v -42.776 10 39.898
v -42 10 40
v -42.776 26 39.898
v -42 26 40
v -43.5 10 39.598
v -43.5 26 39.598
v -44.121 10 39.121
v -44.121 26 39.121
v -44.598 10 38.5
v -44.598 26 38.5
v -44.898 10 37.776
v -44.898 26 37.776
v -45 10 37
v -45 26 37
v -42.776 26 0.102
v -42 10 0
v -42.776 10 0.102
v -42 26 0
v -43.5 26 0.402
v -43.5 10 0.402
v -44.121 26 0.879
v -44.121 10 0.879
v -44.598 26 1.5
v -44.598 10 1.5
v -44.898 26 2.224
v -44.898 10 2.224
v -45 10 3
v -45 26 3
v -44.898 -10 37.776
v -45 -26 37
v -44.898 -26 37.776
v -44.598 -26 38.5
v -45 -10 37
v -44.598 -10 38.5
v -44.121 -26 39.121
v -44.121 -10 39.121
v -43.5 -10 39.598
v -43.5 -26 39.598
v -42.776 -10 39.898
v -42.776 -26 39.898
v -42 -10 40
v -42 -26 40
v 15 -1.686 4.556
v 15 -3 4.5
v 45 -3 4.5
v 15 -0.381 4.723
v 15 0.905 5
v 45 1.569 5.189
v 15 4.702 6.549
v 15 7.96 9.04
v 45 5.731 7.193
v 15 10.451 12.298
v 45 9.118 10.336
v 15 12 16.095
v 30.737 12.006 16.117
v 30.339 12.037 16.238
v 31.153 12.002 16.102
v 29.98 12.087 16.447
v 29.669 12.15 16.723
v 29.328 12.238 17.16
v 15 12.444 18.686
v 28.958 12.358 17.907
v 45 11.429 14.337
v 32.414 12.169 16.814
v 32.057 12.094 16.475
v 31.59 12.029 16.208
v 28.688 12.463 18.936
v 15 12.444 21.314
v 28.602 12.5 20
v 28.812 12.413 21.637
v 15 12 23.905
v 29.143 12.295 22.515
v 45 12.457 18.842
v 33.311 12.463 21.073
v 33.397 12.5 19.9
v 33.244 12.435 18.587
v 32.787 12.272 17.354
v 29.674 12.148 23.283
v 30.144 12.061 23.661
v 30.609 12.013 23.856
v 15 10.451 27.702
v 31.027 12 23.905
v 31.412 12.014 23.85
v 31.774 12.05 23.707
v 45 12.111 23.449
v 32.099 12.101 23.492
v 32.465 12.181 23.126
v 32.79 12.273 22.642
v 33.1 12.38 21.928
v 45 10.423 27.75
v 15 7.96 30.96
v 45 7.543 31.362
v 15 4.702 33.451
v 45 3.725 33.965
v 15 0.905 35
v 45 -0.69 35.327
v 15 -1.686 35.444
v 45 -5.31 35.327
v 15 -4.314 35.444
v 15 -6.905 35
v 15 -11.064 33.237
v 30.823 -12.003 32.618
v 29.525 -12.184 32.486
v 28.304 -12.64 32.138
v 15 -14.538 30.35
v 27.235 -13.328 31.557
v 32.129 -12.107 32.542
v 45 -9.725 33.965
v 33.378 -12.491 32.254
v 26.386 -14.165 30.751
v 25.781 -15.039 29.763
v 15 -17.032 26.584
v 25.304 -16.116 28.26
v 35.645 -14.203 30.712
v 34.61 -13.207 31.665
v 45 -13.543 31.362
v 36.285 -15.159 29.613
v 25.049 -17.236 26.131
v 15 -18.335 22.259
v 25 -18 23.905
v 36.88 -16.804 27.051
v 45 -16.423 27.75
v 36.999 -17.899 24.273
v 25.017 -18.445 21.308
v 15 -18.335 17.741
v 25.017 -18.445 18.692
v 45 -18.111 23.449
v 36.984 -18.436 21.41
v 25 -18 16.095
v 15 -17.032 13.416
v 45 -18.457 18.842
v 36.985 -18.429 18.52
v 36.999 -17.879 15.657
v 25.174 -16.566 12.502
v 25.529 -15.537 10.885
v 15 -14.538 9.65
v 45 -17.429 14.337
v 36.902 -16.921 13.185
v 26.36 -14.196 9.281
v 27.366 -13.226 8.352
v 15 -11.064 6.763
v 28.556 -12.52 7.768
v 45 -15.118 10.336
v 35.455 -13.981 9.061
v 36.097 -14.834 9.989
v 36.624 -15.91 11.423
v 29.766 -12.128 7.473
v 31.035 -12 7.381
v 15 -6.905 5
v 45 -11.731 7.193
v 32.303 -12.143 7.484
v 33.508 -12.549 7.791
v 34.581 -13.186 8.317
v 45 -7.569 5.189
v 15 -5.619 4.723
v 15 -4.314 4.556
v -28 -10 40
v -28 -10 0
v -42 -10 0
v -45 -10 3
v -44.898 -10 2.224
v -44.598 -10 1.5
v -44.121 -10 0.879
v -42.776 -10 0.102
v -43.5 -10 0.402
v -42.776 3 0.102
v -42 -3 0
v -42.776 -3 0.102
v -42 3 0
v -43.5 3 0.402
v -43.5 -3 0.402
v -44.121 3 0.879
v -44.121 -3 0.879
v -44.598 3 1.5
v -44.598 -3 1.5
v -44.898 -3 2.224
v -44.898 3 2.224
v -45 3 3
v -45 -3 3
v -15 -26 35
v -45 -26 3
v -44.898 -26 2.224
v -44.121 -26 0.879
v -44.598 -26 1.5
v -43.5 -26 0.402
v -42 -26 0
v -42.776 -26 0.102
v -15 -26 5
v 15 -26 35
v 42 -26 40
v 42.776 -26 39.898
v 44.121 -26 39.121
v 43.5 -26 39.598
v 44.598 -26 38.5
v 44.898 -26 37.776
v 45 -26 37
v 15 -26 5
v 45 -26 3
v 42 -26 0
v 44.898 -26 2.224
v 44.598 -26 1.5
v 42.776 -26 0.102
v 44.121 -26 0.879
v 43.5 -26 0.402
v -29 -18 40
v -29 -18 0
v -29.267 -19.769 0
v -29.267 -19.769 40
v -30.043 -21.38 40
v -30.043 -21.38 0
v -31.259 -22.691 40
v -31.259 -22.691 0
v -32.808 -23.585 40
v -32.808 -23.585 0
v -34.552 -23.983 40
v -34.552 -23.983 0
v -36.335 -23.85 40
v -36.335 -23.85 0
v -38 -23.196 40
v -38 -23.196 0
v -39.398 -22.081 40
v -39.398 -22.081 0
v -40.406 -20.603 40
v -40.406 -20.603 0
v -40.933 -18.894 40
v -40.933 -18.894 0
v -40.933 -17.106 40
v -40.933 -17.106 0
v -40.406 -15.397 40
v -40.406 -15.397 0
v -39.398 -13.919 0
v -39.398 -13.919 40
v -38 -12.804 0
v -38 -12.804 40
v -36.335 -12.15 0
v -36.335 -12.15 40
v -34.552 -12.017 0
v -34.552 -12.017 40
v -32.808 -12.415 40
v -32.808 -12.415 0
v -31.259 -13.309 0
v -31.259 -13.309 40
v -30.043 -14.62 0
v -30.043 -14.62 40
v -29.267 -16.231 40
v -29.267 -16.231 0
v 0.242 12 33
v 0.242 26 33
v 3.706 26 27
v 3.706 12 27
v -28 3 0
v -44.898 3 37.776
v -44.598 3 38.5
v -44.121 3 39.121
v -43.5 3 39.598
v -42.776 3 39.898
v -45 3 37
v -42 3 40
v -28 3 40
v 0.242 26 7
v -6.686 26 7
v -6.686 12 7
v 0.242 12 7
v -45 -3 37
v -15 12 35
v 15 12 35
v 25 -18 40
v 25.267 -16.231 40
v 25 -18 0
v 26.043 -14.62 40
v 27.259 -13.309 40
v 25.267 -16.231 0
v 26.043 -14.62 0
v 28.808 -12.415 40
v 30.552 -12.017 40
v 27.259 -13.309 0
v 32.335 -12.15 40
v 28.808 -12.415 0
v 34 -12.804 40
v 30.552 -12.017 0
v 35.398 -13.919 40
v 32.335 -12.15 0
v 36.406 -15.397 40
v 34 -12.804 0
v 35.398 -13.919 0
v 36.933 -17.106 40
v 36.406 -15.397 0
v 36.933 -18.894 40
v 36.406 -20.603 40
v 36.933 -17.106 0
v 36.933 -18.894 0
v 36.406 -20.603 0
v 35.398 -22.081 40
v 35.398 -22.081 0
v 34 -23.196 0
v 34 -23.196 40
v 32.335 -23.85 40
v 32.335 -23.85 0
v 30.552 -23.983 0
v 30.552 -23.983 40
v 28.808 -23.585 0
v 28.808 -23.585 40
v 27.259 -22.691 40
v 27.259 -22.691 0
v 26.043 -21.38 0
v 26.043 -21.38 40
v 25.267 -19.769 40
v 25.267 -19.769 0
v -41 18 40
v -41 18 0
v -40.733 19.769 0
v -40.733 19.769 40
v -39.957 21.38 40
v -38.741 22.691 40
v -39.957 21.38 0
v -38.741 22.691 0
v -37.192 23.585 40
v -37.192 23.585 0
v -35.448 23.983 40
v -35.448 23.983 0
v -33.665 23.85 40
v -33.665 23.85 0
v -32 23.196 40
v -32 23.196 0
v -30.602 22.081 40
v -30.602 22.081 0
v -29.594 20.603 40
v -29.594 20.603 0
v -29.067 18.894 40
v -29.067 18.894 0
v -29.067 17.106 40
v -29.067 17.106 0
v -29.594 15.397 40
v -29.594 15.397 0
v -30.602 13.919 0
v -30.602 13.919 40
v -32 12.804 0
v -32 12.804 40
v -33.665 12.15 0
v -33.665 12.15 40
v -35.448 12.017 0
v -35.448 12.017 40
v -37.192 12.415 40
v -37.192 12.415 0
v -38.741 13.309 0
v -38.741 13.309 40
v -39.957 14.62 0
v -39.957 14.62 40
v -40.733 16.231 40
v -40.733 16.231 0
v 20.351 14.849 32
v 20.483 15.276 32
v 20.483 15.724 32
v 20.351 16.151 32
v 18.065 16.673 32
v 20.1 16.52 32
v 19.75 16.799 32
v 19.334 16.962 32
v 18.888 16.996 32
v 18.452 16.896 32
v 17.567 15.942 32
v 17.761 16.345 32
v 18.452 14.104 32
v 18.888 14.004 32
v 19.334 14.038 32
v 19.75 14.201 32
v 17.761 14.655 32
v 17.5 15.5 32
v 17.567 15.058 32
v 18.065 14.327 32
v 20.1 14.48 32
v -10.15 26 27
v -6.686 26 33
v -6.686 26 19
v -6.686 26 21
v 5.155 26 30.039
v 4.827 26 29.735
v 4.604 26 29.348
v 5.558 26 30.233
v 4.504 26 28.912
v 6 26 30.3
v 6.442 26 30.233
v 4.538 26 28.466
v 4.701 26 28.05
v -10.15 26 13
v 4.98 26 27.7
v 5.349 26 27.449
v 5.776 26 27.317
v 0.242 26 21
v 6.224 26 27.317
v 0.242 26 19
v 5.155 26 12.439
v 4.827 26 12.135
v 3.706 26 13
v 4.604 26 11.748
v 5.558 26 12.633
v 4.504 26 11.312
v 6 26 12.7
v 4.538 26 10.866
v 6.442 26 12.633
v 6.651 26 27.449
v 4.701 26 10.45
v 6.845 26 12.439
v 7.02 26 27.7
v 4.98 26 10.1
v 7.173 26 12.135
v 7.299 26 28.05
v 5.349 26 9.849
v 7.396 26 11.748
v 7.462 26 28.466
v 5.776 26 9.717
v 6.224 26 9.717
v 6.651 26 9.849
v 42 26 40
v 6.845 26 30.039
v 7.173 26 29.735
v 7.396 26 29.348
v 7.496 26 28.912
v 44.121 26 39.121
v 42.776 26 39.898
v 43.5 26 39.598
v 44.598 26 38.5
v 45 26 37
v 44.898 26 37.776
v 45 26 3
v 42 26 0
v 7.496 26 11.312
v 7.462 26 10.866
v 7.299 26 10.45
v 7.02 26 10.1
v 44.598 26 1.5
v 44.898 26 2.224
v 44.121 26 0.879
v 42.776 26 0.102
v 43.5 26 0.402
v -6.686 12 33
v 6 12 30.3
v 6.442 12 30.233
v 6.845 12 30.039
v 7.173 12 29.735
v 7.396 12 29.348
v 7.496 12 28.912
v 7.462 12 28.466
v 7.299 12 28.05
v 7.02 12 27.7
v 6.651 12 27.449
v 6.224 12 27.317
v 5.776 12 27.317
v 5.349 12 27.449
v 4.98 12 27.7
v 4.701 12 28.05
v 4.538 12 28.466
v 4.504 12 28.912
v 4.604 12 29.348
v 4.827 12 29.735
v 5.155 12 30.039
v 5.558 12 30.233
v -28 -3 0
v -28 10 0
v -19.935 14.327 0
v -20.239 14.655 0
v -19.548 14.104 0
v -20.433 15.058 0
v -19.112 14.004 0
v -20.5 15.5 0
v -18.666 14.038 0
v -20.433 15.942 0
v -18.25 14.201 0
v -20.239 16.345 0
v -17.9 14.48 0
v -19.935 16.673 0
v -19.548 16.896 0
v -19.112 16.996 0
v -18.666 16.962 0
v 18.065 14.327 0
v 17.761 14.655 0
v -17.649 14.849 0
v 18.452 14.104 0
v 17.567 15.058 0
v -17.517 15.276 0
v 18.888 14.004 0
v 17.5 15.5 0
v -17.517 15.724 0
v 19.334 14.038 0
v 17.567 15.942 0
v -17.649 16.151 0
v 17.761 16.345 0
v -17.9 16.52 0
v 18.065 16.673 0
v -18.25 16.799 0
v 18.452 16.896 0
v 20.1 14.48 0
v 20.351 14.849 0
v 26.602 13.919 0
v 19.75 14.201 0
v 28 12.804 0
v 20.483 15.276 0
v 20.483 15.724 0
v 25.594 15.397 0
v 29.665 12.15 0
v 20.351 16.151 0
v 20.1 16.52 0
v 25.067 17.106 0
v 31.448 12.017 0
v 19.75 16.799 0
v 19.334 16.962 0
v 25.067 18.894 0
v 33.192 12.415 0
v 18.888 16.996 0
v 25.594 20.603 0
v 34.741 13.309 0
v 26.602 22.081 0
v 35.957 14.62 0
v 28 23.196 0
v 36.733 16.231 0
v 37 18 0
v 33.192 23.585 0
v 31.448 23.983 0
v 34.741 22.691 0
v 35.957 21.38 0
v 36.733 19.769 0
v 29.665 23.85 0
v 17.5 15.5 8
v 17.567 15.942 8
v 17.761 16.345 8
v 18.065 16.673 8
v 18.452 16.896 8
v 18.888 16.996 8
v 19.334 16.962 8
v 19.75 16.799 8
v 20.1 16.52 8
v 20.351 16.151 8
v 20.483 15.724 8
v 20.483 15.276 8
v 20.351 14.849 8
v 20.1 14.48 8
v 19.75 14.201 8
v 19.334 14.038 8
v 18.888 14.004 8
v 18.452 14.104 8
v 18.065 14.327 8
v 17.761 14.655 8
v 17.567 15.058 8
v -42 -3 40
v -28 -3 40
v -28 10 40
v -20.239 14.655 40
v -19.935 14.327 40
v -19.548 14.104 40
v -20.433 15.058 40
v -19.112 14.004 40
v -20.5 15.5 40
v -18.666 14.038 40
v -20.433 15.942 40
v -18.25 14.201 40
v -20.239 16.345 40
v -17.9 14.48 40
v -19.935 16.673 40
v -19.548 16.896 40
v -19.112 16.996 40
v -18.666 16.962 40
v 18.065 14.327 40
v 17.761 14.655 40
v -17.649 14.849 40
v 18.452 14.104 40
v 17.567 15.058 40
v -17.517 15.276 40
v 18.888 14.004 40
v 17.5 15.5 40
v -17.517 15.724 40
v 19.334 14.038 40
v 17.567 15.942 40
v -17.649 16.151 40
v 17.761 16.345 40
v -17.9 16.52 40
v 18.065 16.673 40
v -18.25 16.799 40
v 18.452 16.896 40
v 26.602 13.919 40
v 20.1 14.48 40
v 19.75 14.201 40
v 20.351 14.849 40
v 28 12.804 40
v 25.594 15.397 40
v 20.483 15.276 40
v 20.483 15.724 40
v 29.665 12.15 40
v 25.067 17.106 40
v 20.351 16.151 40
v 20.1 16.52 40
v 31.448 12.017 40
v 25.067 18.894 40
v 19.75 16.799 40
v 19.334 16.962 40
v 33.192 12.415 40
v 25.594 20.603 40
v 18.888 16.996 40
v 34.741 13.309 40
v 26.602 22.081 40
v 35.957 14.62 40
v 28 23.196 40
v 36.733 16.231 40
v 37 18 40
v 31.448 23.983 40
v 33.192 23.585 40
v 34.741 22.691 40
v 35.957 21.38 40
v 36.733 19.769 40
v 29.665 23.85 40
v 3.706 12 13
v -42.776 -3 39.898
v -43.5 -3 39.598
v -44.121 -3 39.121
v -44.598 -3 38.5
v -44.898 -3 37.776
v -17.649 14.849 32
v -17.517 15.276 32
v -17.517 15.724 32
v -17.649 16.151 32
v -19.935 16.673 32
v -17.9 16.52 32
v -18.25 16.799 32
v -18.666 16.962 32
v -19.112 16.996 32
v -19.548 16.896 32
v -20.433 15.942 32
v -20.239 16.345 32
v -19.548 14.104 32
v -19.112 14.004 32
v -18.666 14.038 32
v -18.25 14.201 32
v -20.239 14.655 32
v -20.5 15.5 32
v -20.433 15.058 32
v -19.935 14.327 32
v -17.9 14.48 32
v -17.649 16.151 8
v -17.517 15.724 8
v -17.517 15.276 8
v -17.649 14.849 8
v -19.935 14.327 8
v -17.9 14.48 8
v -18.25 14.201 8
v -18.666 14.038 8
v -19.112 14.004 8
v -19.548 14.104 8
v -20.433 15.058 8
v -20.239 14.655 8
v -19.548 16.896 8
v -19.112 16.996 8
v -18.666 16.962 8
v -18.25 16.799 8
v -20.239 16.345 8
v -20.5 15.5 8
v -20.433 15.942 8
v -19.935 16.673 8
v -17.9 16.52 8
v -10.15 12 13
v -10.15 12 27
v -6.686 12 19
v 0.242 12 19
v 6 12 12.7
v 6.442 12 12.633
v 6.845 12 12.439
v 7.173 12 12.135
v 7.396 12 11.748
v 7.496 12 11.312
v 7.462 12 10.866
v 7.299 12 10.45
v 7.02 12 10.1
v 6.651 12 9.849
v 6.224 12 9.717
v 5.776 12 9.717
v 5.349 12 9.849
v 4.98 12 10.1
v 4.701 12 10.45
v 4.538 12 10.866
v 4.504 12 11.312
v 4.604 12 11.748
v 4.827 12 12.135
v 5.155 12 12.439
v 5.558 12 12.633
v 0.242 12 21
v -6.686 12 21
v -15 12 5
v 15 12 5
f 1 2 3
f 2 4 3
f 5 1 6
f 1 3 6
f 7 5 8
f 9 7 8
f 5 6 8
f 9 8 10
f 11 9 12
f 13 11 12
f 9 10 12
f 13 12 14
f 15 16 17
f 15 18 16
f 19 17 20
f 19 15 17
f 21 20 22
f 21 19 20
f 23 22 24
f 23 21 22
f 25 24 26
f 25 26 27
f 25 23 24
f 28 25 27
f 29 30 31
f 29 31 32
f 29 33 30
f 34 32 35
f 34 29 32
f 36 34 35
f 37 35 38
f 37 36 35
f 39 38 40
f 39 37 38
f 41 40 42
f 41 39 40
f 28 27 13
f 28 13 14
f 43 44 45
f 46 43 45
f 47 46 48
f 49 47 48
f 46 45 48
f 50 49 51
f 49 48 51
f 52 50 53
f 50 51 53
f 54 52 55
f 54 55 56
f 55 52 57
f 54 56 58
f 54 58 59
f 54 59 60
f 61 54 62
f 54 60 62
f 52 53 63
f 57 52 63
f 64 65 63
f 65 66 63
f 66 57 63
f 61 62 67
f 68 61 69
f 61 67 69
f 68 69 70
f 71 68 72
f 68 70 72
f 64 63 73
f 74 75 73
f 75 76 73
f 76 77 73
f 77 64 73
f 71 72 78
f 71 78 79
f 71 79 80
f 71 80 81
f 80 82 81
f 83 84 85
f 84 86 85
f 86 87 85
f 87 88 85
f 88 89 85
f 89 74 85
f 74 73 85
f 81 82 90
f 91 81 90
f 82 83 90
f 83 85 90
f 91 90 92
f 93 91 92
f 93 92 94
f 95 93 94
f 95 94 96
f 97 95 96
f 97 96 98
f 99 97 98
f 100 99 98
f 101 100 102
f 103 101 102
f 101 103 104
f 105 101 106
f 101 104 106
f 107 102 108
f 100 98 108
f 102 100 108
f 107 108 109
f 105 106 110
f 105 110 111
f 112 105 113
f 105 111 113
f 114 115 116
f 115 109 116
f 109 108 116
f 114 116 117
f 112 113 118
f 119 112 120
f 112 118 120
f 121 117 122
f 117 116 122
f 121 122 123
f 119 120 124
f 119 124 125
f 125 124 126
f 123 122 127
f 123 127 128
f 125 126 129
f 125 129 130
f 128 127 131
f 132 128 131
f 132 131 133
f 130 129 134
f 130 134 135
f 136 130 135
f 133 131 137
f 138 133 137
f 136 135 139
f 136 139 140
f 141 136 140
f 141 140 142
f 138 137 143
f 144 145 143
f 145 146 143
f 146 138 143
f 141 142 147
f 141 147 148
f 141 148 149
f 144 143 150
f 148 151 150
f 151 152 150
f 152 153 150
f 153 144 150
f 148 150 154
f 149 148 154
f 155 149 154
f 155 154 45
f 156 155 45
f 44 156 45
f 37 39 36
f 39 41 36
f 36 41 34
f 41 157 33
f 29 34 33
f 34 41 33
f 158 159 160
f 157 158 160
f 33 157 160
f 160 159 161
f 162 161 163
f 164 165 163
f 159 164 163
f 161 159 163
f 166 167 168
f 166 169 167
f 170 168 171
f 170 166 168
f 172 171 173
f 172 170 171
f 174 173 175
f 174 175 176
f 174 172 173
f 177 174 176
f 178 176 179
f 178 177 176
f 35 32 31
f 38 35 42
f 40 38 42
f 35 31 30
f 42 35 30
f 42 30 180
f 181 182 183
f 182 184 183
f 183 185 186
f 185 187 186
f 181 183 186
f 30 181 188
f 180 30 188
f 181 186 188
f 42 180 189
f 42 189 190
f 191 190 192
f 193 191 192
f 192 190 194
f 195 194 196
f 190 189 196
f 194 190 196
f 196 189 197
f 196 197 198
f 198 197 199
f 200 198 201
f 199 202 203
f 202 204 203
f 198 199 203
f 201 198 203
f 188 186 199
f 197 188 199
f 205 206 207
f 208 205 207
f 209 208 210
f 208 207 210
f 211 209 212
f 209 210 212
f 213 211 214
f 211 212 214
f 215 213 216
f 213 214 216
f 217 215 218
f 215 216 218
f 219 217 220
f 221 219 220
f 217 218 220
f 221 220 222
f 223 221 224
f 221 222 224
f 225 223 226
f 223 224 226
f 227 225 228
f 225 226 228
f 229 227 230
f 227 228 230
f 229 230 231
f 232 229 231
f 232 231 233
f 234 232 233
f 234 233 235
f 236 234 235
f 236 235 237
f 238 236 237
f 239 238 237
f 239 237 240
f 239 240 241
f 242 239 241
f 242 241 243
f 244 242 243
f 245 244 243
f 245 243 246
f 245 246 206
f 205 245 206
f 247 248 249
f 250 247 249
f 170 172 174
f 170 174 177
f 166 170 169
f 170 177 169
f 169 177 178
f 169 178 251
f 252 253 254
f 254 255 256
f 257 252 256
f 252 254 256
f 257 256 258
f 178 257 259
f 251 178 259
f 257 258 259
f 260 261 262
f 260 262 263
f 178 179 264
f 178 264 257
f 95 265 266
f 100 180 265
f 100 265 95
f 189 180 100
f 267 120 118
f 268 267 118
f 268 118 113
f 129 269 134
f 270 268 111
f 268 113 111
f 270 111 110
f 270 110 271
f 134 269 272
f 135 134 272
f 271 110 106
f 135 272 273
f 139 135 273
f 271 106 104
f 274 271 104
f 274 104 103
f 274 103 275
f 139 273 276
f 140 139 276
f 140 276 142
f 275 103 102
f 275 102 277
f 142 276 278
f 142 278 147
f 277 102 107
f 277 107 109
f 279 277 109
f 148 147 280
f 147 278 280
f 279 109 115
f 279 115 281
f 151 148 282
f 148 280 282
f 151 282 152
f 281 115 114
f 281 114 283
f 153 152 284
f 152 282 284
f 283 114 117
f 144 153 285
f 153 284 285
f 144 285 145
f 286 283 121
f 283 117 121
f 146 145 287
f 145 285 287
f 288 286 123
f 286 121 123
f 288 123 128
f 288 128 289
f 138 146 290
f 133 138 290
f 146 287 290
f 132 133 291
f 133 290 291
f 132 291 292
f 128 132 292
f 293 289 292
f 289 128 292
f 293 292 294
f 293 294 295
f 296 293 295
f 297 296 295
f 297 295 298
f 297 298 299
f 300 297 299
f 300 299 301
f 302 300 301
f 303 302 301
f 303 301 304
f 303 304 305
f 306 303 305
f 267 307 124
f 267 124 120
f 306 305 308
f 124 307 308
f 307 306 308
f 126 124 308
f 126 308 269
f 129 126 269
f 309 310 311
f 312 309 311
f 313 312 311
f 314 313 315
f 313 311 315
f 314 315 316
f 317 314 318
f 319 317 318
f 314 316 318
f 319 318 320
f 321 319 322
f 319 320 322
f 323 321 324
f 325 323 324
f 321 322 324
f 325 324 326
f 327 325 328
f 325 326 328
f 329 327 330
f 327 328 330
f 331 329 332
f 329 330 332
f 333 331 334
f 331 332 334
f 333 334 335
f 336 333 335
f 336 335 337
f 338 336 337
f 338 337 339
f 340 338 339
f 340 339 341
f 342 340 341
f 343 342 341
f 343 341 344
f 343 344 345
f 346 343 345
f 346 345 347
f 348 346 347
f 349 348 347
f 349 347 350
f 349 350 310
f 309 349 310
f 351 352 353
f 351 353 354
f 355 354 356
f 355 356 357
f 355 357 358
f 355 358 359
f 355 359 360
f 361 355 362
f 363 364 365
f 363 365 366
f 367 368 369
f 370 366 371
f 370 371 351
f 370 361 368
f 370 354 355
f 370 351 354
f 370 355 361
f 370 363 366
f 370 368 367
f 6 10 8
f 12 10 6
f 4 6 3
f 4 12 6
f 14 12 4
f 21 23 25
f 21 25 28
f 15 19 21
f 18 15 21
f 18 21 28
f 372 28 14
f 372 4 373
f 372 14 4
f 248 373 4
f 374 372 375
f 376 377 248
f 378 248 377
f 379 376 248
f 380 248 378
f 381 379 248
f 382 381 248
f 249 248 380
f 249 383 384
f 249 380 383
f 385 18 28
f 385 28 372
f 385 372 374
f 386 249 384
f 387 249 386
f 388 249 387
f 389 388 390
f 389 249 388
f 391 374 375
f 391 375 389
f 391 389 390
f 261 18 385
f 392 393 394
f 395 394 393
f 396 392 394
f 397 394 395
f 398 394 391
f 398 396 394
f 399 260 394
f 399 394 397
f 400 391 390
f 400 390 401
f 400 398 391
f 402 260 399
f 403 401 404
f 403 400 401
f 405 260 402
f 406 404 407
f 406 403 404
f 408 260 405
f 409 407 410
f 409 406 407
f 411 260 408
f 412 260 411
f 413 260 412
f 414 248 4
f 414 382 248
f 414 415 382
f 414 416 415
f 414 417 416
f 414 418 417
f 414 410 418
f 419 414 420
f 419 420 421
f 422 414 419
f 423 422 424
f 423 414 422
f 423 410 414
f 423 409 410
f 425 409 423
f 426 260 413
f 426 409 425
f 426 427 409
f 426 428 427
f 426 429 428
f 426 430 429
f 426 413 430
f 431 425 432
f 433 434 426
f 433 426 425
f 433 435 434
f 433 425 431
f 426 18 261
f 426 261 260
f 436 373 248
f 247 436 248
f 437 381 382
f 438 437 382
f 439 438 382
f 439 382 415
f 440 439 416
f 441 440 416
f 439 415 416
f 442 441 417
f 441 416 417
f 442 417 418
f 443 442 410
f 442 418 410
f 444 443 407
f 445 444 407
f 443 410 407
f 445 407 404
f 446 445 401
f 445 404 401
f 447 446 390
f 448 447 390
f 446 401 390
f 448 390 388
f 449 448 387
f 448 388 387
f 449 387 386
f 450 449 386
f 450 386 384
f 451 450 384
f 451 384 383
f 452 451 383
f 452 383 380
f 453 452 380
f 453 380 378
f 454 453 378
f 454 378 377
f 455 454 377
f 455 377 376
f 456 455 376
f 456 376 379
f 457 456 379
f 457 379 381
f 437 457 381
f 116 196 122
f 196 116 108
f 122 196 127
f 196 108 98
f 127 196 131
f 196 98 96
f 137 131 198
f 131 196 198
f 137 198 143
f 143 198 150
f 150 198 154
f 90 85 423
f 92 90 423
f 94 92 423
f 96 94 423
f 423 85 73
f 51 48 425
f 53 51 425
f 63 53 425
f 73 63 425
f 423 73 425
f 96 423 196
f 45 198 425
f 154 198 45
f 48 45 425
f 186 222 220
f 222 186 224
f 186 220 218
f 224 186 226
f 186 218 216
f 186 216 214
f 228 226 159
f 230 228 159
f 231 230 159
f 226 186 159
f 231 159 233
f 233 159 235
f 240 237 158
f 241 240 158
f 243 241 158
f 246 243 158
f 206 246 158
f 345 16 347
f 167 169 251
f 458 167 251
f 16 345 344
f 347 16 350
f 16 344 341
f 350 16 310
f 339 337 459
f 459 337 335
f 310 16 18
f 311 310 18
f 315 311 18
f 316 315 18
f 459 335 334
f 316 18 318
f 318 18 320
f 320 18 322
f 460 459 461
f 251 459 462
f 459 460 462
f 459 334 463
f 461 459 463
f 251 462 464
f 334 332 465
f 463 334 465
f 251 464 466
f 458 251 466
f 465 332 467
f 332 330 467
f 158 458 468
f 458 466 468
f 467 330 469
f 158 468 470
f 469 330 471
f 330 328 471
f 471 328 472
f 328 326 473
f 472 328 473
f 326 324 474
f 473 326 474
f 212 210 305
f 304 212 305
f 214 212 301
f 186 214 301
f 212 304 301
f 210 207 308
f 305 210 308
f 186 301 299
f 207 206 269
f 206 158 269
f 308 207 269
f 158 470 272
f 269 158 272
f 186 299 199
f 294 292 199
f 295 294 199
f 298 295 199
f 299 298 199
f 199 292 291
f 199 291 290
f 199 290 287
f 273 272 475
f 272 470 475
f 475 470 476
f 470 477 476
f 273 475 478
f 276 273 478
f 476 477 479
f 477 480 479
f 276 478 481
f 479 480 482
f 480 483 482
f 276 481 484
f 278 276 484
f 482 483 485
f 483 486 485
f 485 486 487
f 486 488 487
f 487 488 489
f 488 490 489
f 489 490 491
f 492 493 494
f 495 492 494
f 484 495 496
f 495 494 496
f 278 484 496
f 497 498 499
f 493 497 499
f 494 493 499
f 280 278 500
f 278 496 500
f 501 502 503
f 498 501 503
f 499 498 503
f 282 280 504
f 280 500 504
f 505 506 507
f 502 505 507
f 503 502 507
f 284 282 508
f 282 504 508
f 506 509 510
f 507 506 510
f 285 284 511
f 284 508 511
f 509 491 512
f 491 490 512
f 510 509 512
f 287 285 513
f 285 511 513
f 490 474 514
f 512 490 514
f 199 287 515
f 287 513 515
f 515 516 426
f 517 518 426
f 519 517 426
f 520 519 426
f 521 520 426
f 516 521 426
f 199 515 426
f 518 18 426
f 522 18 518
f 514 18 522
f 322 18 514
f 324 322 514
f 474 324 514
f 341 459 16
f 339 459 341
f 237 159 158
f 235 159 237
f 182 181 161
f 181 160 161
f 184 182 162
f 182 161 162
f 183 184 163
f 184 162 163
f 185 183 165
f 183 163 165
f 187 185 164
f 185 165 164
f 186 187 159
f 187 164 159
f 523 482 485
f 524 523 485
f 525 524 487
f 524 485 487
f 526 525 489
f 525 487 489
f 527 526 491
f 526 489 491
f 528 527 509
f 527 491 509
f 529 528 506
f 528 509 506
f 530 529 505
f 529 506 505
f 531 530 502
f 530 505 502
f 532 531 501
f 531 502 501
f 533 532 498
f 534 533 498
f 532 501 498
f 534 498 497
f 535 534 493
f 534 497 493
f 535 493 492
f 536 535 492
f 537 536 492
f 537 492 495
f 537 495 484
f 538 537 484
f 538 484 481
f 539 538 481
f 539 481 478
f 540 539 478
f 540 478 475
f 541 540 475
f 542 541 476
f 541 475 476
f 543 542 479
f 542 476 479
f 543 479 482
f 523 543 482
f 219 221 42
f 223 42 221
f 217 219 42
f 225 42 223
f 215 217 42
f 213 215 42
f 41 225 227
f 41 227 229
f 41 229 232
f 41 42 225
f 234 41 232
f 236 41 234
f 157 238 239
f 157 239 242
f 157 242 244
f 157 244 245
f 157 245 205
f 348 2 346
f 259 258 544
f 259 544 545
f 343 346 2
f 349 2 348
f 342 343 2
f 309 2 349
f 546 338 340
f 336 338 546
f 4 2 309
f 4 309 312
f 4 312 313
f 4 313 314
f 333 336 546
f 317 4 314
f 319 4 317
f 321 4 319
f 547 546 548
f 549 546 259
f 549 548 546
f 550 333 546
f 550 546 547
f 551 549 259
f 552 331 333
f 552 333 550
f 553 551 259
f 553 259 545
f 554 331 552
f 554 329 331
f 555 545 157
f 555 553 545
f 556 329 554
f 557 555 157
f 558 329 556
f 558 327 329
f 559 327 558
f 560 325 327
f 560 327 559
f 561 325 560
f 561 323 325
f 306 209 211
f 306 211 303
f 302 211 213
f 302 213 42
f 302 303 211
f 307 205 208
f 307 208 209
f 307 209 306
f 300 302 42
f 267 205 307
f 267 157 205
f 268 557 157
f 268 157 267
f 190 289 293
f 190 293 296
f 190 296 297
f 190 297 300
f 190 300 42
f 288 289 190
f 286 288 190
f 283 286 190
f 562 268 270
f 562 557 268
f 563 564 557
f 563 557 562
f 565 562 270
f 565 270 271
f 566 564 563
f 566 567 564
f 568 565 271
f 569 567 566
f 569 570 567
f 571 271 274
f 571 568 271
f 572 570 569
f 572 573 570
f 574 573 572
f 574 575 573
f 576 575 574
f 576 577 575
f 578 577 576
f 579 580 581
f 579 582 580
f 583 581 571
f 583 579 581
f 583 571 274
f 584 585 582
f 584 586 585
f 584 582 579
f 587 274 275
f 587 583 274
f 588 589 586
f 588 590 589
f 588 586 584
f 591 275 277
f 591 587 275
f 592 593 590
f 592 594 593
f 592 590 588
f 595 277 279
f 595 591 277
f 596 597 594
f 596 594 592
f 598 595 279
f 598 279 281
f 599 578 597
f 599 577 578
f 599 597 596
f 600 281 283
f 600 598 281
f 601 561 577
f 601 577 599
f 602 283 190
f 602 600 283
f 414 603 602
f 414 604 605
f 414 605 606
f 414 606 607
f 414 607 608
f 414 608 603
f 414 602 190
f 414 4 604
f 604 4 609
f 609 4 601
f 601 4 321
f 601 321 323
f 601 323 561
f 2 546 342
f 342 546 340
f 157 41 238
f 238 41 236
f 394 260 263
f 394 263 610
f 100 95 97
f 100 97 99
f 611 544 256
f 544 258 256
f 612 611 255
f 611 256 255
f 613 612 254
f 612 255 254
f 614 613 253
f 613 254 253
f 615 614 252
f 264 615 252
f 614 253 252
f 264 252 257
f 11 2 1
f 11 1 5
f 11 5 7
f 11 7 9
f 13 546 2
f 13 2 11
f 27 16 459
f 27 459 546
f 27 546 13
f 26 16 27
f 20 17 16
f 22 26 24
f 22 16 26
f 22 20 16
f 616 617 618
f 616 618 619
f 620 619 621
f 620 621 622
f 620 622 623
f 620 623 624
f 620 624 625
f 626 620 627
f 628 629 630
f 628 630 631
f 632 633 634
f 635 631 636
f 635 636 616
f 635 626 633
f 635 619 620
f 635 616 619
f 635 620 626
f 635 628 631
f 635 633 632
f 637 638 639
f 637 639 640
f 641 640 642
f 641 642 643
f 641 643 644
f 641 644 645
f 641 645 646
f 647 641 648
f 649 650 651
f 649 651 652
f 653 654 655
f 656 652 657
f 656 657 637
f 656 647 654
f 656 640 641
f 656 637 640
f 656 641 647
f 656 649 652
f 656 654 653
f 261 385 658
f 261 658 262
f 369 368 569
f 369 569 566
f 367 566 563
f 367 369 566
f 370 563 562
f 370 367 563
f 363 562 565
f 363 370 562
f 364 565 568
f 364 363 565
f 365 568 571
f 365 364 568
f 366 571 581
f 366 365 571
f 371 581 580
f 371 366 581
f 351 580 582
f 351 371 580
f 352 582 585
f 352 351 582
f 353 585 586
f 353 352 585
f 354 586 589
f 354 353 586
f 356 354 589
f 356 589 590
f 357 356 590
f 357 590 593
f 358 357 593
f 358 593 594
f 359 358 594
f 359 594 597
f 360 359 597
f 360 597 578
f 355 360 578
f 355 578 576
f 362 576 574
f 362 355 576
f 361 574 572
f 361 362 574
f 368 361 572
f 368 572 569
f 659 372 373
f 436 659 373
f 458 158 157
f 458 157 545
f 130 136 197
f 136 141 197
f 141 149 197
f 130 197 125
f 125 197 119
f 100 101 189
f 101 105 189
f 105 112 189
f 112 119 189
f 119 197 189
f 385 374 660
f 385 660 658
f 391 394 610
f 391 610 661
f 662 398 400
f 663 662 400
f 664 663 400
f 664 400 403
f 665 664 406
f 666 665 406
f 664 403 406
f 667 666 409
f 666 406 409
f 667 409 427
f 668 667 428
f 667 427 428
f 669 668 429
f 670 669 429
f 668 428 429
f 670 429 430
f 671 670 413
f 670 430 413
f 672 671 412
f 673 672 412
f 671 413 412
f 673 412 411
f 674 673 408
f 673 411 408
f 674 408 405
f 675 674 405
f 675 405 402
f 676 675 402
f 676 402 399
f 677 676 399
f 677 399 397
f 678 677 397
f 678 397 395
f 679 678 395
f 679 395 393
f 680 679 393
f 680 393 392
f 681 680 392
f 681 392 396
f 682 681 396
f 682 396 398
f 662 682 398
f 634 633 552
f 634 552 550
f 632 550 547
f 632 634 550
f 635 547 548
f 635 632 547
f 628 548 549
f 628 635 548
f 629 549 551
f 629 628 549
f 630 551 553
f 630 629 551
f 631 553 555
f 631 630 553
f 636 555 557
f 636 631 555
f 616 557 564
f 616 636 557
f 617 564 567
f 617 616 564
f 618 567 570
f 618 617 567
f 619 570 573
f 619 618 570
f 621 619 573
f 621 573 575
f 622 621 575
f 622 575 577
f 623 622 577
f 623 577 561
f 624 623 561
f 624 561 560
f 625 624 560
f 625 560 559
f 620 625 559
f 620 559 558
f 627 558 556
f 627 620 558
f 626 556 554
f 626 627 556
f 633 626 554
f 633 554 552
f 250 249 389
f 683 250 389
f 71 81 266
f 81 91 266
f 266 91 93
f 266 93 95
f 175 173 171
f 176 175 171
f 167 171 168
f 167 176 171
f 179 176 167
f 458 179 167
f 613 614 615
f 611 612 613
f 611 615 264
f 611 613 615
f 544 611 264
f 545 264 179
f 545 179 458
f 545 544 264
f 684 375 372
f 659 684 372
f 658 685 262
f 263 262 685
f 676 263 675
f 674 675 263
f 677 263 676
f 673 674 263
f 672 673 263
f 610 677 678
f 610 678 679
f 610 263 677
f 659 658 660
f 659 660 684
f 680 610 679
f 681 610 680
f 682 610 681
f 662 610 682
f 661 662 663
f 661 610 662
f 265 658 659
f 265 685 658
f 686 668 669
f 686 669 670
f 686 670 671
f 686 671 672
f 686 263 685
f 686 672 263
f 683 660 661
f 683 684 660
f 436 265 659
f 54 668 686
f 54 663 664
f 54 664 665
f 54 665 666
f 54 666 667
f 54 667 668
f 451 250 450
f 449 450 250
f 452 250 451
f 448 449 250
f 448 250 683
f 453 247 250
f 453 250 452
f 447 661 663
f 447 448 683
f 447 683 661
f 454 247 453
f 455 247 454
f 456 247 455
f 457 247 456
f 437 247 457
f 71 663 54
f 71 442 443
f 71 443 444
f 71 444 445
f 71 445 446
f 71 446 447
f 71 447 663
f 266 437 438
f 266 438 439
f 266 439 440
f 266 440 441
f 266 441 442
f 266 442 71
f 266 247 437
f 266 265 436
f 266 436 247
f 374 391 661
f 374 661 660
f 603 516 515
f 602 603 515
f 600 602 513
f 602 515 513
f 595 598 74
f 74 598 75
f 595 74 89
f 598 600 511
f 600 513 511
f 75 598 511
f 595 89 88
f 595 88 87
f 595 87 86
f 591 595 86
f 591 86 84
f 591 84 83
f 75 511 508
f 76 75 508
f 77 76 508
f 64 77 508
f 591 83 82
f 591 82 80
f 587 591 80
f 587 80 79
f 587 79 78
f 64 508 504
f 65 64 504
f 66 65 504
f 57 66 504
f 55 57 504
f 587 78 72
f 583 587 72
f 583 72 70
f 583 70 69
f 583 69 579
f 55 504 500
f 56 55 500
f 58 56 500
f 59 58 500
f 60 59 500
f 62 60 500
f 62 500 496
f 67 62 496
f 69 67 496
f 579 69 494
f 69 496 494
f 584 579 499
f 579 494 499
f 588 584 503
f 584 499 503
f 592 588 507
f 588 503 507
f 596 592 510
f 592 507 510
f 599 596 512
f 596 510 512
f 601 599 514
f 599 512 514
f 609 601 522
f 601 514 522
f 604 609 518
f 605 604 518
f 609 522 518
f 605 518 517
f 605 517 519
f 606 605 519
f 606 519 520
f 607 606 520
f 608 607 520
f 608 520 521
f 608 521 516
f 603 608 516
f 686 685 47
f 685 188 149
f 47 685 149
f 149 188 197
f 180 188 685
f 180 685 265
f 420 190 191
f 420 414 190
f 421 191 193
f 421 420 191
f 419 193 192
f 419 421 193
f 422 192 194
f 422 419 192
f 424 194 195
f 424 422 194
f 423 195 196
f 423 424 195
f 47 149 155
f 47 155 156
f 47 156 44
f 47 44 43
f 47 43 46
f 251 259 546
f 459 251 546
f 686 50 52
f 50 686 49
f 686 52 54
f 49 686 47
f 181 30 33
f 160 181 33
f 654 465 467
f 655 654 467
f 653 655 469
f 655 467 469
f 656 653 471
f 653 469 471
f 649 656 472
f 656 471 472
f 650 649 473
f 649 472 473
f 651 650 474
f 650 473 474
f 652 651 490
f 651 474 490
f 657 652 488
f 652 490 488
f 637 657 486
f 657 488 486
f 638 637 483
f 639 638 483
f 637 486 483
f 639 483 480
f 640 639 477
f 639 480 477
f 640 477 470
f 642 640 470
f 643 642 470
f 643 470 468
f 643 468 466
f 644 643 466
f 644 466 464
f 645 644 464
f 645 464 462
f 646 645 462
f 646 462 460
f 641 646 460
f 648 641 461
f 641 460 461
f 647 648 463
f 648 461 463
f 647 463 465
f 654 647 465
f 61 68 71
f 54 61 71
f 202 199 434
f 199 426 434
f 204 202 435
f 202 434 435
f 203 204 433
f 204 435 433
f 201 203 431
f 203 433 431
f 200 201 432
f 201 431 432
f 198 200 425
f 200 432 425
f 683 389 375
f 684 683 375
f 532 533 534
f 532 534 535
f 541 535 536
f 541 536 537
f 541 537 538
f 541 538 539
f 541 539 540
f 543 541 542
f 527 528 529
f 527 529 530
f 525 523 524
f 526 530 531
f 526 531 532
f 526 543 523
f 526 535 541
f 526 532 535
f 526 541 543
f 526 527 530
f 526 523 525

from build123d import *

# Parameters (mm, degrees)
SKETCH_1_W           = 90
SKETCH_1_H           = 52
EXTRUDE_1_DEPTH      = 40
SKETCH_2_R           = 6
CUT_EXTRUDE_1_DEPTH  = 66.582009728
SKETCH_3_R           = 1.5
CUT_EXTRUDE_2_DEPTH  = 80.555012413
SKETCH_6_R           = 1.5
CUT_EXTRUDE_4_DEPTH  = 8
SKETCH_8_W           = 17
SKETCH_8_H           = 20
CUT_EXTRUDE_5_DEPTH  = 66.582009728
SKETCH_17_W          = 30
SKETCH_17_H          = 30
CUT_EXTRUDE_18_DEPTH = 38
SKETCH_9_R           = 15.5
CUT_EXTRUDE_17_DEPTH = 30
SKETCH_21_W          = 17
SKETCH_21_H          = 6
EXTRUDE_7_DEPTH      = 40
FILLET_3_R           = 3
CUT_EXTRUDE_START    = -8
SKETCH_24_R          = 1.5
CUT_EXTRUDE_16_DEPTH = 8


with BuildPart() as part:
    # 草圖1 → 填料-伸長1 (new body)
    with BuildSketch(Plane.XY):
        Rectangle(SKETCH_1_W, SKETCH_1_H)
    extrude(amount=EXTRUDE_1_DEPTH)

    # 草圖2 → 除料-伸長1 (cut, through all)
    with BuildSketch(Plane(origin=(0, 0, 0), x_dir=(-1, 0, 0), z_dir=(0, 0, -1))):
        with Locations((-31, -18)):
            Circle(SKETCH_2_R)
        with Locations(Location((35, -18, 0), (0, 0, 180))):
            Circle(SKETCH_2_R)
        with Locations((35, 18)):
            Circle(SKETCH_2_R)
        with Locations(Location((-31, 18, 0), (0, 0, 180))):
            Circle(SKETCH_2_R)
    extrude(amount=-CUT_EXTRUDE_1_DEPTH, mode=Mode.SUBTRACT)

    # 草圖3 → 除料-伸長2 (cut, through all)
    with BuildSketch(Plane(origin=(0, 26, 0), x_dir=(1, 0, 0), z_dir=(0, 1, 0))):
        with Locations(Location((6, -28.8, 0), (0, 0, 270))):
            Circle(SKETCH_3_R)
        with Locations(Location((6, -11.2, 0), (0, 0, 270))):
            Circle(SKETCH_3_R)
        Polygon((3.706406461, -27), (0.242304845, -21), (-6.685898385, -21), (-10.15, -27), (-6.685898385, -33), (0.242304845, -33), align=None)
        Polygon((0.242304845, -7), (3.706406461, -13), (0.242304845, -19), (-6.685898385, -19), (-10.15, -13), (-6.685898385, -7), align=None)
    extrude(amount=-CUT_EXTRUDE_2_DEPTH, mode=Mode.SUBTRACT)

    # 草圖6 → 除料-伸長4 (cut)
    with BuildSketch(Plane(origin=(0, 0, 0), x_dir=(-1, 0, 0), z_dir=(0, 0, -1))):
        with Locations((-19, 15.5)):
            Circle(SKETCH_6_R)
        with Locations((19, 15.5)):
            Circle(SKETCH_6_R)
    extrude(amount=-CUT_EXTRUDE_4_DEPTH, mode=Mode.SUBTRACT)

    # 草圖8 → 除料-伸長5 (cut, through all)
    with BuildSketch(Plane(origin=(0, 0, 0), x_dir=(-1, 0, 0), z_dir=(0, 0, -1))):
        with Locations((36.5, 0)):
            Rectangle(SKETCH_8_W, SKETCH_8_H)
    extrude(amount=-CUT_EXTRUDE_5_DEPTH, mode=Mode.SUBTRACT)

    # 草圖17 → 除料-伸長18 (cut)
    with BuildSketch(Plane.XZ.offset(26)):
        with Locations((0, 20)):
            Rectangle(SKETCH_17_W, SKETCH_17_H)
    extrude(amount=-CUT_EXTRUDE_18_DEPTH, mode=Mode.SUBTRACT)

    # 草圖9 → 除料-伸長17 (cut)
    with BuildSketch(Plane(origin=(45, 0, 0), x_dir=(0, 0, -1), z_dir=(1, 0, 0))):
        with Locations((-20, -3)):
            Circle(SKETCH_9_R)
    extrude(amount=-CUT_EXTRUDE_17_DEPTH, mode=Mode.SUBTRACT)

    # 草圖21 → 填料-伸長7 (add)
    with BuildSketch(Plane.XY.offset(40)):
        with Locations((-36.5, 0)):
            Rectangle(SKETCH_21_W, SKETCH_21_H)
    extrude(amount=-EXTRUDE_7_DEPTH)

    # 圓角3
    fillet_3_edges = [part.edges().sort_by_distance(p)[0] for p in [
        (45, 0, 40),
        (-45, 0, 40),
        (-45, 0, 0),
        (-45, 18, 40),
        (45, 0, 0),
        (-45, 18, 0),
        (-45, -18, 0),
        (-45, -18, 40),
    ]]
    fillet(fillet_3_edges, radius=FILLET_3_R)

    # 草圖24 → 除料-伸長16 (cut)
    with BuildSketch(Plane.XY.offset(40).offset(CUT_EXTRUDE_START)):
        with Locations(Location((-19, 15.5, 0), (0, 0, 180))):
            Circle(SKETCH_24_R)
        with Locations(Location((19, 15.5, 0), (0, 0, 180))):
            Circle(SKETCH_24_R)
    extrude(amount=CUT_EXTRUDE_16_DEPTH, mode=Mode.SUBTRACT)


solid = part.part
